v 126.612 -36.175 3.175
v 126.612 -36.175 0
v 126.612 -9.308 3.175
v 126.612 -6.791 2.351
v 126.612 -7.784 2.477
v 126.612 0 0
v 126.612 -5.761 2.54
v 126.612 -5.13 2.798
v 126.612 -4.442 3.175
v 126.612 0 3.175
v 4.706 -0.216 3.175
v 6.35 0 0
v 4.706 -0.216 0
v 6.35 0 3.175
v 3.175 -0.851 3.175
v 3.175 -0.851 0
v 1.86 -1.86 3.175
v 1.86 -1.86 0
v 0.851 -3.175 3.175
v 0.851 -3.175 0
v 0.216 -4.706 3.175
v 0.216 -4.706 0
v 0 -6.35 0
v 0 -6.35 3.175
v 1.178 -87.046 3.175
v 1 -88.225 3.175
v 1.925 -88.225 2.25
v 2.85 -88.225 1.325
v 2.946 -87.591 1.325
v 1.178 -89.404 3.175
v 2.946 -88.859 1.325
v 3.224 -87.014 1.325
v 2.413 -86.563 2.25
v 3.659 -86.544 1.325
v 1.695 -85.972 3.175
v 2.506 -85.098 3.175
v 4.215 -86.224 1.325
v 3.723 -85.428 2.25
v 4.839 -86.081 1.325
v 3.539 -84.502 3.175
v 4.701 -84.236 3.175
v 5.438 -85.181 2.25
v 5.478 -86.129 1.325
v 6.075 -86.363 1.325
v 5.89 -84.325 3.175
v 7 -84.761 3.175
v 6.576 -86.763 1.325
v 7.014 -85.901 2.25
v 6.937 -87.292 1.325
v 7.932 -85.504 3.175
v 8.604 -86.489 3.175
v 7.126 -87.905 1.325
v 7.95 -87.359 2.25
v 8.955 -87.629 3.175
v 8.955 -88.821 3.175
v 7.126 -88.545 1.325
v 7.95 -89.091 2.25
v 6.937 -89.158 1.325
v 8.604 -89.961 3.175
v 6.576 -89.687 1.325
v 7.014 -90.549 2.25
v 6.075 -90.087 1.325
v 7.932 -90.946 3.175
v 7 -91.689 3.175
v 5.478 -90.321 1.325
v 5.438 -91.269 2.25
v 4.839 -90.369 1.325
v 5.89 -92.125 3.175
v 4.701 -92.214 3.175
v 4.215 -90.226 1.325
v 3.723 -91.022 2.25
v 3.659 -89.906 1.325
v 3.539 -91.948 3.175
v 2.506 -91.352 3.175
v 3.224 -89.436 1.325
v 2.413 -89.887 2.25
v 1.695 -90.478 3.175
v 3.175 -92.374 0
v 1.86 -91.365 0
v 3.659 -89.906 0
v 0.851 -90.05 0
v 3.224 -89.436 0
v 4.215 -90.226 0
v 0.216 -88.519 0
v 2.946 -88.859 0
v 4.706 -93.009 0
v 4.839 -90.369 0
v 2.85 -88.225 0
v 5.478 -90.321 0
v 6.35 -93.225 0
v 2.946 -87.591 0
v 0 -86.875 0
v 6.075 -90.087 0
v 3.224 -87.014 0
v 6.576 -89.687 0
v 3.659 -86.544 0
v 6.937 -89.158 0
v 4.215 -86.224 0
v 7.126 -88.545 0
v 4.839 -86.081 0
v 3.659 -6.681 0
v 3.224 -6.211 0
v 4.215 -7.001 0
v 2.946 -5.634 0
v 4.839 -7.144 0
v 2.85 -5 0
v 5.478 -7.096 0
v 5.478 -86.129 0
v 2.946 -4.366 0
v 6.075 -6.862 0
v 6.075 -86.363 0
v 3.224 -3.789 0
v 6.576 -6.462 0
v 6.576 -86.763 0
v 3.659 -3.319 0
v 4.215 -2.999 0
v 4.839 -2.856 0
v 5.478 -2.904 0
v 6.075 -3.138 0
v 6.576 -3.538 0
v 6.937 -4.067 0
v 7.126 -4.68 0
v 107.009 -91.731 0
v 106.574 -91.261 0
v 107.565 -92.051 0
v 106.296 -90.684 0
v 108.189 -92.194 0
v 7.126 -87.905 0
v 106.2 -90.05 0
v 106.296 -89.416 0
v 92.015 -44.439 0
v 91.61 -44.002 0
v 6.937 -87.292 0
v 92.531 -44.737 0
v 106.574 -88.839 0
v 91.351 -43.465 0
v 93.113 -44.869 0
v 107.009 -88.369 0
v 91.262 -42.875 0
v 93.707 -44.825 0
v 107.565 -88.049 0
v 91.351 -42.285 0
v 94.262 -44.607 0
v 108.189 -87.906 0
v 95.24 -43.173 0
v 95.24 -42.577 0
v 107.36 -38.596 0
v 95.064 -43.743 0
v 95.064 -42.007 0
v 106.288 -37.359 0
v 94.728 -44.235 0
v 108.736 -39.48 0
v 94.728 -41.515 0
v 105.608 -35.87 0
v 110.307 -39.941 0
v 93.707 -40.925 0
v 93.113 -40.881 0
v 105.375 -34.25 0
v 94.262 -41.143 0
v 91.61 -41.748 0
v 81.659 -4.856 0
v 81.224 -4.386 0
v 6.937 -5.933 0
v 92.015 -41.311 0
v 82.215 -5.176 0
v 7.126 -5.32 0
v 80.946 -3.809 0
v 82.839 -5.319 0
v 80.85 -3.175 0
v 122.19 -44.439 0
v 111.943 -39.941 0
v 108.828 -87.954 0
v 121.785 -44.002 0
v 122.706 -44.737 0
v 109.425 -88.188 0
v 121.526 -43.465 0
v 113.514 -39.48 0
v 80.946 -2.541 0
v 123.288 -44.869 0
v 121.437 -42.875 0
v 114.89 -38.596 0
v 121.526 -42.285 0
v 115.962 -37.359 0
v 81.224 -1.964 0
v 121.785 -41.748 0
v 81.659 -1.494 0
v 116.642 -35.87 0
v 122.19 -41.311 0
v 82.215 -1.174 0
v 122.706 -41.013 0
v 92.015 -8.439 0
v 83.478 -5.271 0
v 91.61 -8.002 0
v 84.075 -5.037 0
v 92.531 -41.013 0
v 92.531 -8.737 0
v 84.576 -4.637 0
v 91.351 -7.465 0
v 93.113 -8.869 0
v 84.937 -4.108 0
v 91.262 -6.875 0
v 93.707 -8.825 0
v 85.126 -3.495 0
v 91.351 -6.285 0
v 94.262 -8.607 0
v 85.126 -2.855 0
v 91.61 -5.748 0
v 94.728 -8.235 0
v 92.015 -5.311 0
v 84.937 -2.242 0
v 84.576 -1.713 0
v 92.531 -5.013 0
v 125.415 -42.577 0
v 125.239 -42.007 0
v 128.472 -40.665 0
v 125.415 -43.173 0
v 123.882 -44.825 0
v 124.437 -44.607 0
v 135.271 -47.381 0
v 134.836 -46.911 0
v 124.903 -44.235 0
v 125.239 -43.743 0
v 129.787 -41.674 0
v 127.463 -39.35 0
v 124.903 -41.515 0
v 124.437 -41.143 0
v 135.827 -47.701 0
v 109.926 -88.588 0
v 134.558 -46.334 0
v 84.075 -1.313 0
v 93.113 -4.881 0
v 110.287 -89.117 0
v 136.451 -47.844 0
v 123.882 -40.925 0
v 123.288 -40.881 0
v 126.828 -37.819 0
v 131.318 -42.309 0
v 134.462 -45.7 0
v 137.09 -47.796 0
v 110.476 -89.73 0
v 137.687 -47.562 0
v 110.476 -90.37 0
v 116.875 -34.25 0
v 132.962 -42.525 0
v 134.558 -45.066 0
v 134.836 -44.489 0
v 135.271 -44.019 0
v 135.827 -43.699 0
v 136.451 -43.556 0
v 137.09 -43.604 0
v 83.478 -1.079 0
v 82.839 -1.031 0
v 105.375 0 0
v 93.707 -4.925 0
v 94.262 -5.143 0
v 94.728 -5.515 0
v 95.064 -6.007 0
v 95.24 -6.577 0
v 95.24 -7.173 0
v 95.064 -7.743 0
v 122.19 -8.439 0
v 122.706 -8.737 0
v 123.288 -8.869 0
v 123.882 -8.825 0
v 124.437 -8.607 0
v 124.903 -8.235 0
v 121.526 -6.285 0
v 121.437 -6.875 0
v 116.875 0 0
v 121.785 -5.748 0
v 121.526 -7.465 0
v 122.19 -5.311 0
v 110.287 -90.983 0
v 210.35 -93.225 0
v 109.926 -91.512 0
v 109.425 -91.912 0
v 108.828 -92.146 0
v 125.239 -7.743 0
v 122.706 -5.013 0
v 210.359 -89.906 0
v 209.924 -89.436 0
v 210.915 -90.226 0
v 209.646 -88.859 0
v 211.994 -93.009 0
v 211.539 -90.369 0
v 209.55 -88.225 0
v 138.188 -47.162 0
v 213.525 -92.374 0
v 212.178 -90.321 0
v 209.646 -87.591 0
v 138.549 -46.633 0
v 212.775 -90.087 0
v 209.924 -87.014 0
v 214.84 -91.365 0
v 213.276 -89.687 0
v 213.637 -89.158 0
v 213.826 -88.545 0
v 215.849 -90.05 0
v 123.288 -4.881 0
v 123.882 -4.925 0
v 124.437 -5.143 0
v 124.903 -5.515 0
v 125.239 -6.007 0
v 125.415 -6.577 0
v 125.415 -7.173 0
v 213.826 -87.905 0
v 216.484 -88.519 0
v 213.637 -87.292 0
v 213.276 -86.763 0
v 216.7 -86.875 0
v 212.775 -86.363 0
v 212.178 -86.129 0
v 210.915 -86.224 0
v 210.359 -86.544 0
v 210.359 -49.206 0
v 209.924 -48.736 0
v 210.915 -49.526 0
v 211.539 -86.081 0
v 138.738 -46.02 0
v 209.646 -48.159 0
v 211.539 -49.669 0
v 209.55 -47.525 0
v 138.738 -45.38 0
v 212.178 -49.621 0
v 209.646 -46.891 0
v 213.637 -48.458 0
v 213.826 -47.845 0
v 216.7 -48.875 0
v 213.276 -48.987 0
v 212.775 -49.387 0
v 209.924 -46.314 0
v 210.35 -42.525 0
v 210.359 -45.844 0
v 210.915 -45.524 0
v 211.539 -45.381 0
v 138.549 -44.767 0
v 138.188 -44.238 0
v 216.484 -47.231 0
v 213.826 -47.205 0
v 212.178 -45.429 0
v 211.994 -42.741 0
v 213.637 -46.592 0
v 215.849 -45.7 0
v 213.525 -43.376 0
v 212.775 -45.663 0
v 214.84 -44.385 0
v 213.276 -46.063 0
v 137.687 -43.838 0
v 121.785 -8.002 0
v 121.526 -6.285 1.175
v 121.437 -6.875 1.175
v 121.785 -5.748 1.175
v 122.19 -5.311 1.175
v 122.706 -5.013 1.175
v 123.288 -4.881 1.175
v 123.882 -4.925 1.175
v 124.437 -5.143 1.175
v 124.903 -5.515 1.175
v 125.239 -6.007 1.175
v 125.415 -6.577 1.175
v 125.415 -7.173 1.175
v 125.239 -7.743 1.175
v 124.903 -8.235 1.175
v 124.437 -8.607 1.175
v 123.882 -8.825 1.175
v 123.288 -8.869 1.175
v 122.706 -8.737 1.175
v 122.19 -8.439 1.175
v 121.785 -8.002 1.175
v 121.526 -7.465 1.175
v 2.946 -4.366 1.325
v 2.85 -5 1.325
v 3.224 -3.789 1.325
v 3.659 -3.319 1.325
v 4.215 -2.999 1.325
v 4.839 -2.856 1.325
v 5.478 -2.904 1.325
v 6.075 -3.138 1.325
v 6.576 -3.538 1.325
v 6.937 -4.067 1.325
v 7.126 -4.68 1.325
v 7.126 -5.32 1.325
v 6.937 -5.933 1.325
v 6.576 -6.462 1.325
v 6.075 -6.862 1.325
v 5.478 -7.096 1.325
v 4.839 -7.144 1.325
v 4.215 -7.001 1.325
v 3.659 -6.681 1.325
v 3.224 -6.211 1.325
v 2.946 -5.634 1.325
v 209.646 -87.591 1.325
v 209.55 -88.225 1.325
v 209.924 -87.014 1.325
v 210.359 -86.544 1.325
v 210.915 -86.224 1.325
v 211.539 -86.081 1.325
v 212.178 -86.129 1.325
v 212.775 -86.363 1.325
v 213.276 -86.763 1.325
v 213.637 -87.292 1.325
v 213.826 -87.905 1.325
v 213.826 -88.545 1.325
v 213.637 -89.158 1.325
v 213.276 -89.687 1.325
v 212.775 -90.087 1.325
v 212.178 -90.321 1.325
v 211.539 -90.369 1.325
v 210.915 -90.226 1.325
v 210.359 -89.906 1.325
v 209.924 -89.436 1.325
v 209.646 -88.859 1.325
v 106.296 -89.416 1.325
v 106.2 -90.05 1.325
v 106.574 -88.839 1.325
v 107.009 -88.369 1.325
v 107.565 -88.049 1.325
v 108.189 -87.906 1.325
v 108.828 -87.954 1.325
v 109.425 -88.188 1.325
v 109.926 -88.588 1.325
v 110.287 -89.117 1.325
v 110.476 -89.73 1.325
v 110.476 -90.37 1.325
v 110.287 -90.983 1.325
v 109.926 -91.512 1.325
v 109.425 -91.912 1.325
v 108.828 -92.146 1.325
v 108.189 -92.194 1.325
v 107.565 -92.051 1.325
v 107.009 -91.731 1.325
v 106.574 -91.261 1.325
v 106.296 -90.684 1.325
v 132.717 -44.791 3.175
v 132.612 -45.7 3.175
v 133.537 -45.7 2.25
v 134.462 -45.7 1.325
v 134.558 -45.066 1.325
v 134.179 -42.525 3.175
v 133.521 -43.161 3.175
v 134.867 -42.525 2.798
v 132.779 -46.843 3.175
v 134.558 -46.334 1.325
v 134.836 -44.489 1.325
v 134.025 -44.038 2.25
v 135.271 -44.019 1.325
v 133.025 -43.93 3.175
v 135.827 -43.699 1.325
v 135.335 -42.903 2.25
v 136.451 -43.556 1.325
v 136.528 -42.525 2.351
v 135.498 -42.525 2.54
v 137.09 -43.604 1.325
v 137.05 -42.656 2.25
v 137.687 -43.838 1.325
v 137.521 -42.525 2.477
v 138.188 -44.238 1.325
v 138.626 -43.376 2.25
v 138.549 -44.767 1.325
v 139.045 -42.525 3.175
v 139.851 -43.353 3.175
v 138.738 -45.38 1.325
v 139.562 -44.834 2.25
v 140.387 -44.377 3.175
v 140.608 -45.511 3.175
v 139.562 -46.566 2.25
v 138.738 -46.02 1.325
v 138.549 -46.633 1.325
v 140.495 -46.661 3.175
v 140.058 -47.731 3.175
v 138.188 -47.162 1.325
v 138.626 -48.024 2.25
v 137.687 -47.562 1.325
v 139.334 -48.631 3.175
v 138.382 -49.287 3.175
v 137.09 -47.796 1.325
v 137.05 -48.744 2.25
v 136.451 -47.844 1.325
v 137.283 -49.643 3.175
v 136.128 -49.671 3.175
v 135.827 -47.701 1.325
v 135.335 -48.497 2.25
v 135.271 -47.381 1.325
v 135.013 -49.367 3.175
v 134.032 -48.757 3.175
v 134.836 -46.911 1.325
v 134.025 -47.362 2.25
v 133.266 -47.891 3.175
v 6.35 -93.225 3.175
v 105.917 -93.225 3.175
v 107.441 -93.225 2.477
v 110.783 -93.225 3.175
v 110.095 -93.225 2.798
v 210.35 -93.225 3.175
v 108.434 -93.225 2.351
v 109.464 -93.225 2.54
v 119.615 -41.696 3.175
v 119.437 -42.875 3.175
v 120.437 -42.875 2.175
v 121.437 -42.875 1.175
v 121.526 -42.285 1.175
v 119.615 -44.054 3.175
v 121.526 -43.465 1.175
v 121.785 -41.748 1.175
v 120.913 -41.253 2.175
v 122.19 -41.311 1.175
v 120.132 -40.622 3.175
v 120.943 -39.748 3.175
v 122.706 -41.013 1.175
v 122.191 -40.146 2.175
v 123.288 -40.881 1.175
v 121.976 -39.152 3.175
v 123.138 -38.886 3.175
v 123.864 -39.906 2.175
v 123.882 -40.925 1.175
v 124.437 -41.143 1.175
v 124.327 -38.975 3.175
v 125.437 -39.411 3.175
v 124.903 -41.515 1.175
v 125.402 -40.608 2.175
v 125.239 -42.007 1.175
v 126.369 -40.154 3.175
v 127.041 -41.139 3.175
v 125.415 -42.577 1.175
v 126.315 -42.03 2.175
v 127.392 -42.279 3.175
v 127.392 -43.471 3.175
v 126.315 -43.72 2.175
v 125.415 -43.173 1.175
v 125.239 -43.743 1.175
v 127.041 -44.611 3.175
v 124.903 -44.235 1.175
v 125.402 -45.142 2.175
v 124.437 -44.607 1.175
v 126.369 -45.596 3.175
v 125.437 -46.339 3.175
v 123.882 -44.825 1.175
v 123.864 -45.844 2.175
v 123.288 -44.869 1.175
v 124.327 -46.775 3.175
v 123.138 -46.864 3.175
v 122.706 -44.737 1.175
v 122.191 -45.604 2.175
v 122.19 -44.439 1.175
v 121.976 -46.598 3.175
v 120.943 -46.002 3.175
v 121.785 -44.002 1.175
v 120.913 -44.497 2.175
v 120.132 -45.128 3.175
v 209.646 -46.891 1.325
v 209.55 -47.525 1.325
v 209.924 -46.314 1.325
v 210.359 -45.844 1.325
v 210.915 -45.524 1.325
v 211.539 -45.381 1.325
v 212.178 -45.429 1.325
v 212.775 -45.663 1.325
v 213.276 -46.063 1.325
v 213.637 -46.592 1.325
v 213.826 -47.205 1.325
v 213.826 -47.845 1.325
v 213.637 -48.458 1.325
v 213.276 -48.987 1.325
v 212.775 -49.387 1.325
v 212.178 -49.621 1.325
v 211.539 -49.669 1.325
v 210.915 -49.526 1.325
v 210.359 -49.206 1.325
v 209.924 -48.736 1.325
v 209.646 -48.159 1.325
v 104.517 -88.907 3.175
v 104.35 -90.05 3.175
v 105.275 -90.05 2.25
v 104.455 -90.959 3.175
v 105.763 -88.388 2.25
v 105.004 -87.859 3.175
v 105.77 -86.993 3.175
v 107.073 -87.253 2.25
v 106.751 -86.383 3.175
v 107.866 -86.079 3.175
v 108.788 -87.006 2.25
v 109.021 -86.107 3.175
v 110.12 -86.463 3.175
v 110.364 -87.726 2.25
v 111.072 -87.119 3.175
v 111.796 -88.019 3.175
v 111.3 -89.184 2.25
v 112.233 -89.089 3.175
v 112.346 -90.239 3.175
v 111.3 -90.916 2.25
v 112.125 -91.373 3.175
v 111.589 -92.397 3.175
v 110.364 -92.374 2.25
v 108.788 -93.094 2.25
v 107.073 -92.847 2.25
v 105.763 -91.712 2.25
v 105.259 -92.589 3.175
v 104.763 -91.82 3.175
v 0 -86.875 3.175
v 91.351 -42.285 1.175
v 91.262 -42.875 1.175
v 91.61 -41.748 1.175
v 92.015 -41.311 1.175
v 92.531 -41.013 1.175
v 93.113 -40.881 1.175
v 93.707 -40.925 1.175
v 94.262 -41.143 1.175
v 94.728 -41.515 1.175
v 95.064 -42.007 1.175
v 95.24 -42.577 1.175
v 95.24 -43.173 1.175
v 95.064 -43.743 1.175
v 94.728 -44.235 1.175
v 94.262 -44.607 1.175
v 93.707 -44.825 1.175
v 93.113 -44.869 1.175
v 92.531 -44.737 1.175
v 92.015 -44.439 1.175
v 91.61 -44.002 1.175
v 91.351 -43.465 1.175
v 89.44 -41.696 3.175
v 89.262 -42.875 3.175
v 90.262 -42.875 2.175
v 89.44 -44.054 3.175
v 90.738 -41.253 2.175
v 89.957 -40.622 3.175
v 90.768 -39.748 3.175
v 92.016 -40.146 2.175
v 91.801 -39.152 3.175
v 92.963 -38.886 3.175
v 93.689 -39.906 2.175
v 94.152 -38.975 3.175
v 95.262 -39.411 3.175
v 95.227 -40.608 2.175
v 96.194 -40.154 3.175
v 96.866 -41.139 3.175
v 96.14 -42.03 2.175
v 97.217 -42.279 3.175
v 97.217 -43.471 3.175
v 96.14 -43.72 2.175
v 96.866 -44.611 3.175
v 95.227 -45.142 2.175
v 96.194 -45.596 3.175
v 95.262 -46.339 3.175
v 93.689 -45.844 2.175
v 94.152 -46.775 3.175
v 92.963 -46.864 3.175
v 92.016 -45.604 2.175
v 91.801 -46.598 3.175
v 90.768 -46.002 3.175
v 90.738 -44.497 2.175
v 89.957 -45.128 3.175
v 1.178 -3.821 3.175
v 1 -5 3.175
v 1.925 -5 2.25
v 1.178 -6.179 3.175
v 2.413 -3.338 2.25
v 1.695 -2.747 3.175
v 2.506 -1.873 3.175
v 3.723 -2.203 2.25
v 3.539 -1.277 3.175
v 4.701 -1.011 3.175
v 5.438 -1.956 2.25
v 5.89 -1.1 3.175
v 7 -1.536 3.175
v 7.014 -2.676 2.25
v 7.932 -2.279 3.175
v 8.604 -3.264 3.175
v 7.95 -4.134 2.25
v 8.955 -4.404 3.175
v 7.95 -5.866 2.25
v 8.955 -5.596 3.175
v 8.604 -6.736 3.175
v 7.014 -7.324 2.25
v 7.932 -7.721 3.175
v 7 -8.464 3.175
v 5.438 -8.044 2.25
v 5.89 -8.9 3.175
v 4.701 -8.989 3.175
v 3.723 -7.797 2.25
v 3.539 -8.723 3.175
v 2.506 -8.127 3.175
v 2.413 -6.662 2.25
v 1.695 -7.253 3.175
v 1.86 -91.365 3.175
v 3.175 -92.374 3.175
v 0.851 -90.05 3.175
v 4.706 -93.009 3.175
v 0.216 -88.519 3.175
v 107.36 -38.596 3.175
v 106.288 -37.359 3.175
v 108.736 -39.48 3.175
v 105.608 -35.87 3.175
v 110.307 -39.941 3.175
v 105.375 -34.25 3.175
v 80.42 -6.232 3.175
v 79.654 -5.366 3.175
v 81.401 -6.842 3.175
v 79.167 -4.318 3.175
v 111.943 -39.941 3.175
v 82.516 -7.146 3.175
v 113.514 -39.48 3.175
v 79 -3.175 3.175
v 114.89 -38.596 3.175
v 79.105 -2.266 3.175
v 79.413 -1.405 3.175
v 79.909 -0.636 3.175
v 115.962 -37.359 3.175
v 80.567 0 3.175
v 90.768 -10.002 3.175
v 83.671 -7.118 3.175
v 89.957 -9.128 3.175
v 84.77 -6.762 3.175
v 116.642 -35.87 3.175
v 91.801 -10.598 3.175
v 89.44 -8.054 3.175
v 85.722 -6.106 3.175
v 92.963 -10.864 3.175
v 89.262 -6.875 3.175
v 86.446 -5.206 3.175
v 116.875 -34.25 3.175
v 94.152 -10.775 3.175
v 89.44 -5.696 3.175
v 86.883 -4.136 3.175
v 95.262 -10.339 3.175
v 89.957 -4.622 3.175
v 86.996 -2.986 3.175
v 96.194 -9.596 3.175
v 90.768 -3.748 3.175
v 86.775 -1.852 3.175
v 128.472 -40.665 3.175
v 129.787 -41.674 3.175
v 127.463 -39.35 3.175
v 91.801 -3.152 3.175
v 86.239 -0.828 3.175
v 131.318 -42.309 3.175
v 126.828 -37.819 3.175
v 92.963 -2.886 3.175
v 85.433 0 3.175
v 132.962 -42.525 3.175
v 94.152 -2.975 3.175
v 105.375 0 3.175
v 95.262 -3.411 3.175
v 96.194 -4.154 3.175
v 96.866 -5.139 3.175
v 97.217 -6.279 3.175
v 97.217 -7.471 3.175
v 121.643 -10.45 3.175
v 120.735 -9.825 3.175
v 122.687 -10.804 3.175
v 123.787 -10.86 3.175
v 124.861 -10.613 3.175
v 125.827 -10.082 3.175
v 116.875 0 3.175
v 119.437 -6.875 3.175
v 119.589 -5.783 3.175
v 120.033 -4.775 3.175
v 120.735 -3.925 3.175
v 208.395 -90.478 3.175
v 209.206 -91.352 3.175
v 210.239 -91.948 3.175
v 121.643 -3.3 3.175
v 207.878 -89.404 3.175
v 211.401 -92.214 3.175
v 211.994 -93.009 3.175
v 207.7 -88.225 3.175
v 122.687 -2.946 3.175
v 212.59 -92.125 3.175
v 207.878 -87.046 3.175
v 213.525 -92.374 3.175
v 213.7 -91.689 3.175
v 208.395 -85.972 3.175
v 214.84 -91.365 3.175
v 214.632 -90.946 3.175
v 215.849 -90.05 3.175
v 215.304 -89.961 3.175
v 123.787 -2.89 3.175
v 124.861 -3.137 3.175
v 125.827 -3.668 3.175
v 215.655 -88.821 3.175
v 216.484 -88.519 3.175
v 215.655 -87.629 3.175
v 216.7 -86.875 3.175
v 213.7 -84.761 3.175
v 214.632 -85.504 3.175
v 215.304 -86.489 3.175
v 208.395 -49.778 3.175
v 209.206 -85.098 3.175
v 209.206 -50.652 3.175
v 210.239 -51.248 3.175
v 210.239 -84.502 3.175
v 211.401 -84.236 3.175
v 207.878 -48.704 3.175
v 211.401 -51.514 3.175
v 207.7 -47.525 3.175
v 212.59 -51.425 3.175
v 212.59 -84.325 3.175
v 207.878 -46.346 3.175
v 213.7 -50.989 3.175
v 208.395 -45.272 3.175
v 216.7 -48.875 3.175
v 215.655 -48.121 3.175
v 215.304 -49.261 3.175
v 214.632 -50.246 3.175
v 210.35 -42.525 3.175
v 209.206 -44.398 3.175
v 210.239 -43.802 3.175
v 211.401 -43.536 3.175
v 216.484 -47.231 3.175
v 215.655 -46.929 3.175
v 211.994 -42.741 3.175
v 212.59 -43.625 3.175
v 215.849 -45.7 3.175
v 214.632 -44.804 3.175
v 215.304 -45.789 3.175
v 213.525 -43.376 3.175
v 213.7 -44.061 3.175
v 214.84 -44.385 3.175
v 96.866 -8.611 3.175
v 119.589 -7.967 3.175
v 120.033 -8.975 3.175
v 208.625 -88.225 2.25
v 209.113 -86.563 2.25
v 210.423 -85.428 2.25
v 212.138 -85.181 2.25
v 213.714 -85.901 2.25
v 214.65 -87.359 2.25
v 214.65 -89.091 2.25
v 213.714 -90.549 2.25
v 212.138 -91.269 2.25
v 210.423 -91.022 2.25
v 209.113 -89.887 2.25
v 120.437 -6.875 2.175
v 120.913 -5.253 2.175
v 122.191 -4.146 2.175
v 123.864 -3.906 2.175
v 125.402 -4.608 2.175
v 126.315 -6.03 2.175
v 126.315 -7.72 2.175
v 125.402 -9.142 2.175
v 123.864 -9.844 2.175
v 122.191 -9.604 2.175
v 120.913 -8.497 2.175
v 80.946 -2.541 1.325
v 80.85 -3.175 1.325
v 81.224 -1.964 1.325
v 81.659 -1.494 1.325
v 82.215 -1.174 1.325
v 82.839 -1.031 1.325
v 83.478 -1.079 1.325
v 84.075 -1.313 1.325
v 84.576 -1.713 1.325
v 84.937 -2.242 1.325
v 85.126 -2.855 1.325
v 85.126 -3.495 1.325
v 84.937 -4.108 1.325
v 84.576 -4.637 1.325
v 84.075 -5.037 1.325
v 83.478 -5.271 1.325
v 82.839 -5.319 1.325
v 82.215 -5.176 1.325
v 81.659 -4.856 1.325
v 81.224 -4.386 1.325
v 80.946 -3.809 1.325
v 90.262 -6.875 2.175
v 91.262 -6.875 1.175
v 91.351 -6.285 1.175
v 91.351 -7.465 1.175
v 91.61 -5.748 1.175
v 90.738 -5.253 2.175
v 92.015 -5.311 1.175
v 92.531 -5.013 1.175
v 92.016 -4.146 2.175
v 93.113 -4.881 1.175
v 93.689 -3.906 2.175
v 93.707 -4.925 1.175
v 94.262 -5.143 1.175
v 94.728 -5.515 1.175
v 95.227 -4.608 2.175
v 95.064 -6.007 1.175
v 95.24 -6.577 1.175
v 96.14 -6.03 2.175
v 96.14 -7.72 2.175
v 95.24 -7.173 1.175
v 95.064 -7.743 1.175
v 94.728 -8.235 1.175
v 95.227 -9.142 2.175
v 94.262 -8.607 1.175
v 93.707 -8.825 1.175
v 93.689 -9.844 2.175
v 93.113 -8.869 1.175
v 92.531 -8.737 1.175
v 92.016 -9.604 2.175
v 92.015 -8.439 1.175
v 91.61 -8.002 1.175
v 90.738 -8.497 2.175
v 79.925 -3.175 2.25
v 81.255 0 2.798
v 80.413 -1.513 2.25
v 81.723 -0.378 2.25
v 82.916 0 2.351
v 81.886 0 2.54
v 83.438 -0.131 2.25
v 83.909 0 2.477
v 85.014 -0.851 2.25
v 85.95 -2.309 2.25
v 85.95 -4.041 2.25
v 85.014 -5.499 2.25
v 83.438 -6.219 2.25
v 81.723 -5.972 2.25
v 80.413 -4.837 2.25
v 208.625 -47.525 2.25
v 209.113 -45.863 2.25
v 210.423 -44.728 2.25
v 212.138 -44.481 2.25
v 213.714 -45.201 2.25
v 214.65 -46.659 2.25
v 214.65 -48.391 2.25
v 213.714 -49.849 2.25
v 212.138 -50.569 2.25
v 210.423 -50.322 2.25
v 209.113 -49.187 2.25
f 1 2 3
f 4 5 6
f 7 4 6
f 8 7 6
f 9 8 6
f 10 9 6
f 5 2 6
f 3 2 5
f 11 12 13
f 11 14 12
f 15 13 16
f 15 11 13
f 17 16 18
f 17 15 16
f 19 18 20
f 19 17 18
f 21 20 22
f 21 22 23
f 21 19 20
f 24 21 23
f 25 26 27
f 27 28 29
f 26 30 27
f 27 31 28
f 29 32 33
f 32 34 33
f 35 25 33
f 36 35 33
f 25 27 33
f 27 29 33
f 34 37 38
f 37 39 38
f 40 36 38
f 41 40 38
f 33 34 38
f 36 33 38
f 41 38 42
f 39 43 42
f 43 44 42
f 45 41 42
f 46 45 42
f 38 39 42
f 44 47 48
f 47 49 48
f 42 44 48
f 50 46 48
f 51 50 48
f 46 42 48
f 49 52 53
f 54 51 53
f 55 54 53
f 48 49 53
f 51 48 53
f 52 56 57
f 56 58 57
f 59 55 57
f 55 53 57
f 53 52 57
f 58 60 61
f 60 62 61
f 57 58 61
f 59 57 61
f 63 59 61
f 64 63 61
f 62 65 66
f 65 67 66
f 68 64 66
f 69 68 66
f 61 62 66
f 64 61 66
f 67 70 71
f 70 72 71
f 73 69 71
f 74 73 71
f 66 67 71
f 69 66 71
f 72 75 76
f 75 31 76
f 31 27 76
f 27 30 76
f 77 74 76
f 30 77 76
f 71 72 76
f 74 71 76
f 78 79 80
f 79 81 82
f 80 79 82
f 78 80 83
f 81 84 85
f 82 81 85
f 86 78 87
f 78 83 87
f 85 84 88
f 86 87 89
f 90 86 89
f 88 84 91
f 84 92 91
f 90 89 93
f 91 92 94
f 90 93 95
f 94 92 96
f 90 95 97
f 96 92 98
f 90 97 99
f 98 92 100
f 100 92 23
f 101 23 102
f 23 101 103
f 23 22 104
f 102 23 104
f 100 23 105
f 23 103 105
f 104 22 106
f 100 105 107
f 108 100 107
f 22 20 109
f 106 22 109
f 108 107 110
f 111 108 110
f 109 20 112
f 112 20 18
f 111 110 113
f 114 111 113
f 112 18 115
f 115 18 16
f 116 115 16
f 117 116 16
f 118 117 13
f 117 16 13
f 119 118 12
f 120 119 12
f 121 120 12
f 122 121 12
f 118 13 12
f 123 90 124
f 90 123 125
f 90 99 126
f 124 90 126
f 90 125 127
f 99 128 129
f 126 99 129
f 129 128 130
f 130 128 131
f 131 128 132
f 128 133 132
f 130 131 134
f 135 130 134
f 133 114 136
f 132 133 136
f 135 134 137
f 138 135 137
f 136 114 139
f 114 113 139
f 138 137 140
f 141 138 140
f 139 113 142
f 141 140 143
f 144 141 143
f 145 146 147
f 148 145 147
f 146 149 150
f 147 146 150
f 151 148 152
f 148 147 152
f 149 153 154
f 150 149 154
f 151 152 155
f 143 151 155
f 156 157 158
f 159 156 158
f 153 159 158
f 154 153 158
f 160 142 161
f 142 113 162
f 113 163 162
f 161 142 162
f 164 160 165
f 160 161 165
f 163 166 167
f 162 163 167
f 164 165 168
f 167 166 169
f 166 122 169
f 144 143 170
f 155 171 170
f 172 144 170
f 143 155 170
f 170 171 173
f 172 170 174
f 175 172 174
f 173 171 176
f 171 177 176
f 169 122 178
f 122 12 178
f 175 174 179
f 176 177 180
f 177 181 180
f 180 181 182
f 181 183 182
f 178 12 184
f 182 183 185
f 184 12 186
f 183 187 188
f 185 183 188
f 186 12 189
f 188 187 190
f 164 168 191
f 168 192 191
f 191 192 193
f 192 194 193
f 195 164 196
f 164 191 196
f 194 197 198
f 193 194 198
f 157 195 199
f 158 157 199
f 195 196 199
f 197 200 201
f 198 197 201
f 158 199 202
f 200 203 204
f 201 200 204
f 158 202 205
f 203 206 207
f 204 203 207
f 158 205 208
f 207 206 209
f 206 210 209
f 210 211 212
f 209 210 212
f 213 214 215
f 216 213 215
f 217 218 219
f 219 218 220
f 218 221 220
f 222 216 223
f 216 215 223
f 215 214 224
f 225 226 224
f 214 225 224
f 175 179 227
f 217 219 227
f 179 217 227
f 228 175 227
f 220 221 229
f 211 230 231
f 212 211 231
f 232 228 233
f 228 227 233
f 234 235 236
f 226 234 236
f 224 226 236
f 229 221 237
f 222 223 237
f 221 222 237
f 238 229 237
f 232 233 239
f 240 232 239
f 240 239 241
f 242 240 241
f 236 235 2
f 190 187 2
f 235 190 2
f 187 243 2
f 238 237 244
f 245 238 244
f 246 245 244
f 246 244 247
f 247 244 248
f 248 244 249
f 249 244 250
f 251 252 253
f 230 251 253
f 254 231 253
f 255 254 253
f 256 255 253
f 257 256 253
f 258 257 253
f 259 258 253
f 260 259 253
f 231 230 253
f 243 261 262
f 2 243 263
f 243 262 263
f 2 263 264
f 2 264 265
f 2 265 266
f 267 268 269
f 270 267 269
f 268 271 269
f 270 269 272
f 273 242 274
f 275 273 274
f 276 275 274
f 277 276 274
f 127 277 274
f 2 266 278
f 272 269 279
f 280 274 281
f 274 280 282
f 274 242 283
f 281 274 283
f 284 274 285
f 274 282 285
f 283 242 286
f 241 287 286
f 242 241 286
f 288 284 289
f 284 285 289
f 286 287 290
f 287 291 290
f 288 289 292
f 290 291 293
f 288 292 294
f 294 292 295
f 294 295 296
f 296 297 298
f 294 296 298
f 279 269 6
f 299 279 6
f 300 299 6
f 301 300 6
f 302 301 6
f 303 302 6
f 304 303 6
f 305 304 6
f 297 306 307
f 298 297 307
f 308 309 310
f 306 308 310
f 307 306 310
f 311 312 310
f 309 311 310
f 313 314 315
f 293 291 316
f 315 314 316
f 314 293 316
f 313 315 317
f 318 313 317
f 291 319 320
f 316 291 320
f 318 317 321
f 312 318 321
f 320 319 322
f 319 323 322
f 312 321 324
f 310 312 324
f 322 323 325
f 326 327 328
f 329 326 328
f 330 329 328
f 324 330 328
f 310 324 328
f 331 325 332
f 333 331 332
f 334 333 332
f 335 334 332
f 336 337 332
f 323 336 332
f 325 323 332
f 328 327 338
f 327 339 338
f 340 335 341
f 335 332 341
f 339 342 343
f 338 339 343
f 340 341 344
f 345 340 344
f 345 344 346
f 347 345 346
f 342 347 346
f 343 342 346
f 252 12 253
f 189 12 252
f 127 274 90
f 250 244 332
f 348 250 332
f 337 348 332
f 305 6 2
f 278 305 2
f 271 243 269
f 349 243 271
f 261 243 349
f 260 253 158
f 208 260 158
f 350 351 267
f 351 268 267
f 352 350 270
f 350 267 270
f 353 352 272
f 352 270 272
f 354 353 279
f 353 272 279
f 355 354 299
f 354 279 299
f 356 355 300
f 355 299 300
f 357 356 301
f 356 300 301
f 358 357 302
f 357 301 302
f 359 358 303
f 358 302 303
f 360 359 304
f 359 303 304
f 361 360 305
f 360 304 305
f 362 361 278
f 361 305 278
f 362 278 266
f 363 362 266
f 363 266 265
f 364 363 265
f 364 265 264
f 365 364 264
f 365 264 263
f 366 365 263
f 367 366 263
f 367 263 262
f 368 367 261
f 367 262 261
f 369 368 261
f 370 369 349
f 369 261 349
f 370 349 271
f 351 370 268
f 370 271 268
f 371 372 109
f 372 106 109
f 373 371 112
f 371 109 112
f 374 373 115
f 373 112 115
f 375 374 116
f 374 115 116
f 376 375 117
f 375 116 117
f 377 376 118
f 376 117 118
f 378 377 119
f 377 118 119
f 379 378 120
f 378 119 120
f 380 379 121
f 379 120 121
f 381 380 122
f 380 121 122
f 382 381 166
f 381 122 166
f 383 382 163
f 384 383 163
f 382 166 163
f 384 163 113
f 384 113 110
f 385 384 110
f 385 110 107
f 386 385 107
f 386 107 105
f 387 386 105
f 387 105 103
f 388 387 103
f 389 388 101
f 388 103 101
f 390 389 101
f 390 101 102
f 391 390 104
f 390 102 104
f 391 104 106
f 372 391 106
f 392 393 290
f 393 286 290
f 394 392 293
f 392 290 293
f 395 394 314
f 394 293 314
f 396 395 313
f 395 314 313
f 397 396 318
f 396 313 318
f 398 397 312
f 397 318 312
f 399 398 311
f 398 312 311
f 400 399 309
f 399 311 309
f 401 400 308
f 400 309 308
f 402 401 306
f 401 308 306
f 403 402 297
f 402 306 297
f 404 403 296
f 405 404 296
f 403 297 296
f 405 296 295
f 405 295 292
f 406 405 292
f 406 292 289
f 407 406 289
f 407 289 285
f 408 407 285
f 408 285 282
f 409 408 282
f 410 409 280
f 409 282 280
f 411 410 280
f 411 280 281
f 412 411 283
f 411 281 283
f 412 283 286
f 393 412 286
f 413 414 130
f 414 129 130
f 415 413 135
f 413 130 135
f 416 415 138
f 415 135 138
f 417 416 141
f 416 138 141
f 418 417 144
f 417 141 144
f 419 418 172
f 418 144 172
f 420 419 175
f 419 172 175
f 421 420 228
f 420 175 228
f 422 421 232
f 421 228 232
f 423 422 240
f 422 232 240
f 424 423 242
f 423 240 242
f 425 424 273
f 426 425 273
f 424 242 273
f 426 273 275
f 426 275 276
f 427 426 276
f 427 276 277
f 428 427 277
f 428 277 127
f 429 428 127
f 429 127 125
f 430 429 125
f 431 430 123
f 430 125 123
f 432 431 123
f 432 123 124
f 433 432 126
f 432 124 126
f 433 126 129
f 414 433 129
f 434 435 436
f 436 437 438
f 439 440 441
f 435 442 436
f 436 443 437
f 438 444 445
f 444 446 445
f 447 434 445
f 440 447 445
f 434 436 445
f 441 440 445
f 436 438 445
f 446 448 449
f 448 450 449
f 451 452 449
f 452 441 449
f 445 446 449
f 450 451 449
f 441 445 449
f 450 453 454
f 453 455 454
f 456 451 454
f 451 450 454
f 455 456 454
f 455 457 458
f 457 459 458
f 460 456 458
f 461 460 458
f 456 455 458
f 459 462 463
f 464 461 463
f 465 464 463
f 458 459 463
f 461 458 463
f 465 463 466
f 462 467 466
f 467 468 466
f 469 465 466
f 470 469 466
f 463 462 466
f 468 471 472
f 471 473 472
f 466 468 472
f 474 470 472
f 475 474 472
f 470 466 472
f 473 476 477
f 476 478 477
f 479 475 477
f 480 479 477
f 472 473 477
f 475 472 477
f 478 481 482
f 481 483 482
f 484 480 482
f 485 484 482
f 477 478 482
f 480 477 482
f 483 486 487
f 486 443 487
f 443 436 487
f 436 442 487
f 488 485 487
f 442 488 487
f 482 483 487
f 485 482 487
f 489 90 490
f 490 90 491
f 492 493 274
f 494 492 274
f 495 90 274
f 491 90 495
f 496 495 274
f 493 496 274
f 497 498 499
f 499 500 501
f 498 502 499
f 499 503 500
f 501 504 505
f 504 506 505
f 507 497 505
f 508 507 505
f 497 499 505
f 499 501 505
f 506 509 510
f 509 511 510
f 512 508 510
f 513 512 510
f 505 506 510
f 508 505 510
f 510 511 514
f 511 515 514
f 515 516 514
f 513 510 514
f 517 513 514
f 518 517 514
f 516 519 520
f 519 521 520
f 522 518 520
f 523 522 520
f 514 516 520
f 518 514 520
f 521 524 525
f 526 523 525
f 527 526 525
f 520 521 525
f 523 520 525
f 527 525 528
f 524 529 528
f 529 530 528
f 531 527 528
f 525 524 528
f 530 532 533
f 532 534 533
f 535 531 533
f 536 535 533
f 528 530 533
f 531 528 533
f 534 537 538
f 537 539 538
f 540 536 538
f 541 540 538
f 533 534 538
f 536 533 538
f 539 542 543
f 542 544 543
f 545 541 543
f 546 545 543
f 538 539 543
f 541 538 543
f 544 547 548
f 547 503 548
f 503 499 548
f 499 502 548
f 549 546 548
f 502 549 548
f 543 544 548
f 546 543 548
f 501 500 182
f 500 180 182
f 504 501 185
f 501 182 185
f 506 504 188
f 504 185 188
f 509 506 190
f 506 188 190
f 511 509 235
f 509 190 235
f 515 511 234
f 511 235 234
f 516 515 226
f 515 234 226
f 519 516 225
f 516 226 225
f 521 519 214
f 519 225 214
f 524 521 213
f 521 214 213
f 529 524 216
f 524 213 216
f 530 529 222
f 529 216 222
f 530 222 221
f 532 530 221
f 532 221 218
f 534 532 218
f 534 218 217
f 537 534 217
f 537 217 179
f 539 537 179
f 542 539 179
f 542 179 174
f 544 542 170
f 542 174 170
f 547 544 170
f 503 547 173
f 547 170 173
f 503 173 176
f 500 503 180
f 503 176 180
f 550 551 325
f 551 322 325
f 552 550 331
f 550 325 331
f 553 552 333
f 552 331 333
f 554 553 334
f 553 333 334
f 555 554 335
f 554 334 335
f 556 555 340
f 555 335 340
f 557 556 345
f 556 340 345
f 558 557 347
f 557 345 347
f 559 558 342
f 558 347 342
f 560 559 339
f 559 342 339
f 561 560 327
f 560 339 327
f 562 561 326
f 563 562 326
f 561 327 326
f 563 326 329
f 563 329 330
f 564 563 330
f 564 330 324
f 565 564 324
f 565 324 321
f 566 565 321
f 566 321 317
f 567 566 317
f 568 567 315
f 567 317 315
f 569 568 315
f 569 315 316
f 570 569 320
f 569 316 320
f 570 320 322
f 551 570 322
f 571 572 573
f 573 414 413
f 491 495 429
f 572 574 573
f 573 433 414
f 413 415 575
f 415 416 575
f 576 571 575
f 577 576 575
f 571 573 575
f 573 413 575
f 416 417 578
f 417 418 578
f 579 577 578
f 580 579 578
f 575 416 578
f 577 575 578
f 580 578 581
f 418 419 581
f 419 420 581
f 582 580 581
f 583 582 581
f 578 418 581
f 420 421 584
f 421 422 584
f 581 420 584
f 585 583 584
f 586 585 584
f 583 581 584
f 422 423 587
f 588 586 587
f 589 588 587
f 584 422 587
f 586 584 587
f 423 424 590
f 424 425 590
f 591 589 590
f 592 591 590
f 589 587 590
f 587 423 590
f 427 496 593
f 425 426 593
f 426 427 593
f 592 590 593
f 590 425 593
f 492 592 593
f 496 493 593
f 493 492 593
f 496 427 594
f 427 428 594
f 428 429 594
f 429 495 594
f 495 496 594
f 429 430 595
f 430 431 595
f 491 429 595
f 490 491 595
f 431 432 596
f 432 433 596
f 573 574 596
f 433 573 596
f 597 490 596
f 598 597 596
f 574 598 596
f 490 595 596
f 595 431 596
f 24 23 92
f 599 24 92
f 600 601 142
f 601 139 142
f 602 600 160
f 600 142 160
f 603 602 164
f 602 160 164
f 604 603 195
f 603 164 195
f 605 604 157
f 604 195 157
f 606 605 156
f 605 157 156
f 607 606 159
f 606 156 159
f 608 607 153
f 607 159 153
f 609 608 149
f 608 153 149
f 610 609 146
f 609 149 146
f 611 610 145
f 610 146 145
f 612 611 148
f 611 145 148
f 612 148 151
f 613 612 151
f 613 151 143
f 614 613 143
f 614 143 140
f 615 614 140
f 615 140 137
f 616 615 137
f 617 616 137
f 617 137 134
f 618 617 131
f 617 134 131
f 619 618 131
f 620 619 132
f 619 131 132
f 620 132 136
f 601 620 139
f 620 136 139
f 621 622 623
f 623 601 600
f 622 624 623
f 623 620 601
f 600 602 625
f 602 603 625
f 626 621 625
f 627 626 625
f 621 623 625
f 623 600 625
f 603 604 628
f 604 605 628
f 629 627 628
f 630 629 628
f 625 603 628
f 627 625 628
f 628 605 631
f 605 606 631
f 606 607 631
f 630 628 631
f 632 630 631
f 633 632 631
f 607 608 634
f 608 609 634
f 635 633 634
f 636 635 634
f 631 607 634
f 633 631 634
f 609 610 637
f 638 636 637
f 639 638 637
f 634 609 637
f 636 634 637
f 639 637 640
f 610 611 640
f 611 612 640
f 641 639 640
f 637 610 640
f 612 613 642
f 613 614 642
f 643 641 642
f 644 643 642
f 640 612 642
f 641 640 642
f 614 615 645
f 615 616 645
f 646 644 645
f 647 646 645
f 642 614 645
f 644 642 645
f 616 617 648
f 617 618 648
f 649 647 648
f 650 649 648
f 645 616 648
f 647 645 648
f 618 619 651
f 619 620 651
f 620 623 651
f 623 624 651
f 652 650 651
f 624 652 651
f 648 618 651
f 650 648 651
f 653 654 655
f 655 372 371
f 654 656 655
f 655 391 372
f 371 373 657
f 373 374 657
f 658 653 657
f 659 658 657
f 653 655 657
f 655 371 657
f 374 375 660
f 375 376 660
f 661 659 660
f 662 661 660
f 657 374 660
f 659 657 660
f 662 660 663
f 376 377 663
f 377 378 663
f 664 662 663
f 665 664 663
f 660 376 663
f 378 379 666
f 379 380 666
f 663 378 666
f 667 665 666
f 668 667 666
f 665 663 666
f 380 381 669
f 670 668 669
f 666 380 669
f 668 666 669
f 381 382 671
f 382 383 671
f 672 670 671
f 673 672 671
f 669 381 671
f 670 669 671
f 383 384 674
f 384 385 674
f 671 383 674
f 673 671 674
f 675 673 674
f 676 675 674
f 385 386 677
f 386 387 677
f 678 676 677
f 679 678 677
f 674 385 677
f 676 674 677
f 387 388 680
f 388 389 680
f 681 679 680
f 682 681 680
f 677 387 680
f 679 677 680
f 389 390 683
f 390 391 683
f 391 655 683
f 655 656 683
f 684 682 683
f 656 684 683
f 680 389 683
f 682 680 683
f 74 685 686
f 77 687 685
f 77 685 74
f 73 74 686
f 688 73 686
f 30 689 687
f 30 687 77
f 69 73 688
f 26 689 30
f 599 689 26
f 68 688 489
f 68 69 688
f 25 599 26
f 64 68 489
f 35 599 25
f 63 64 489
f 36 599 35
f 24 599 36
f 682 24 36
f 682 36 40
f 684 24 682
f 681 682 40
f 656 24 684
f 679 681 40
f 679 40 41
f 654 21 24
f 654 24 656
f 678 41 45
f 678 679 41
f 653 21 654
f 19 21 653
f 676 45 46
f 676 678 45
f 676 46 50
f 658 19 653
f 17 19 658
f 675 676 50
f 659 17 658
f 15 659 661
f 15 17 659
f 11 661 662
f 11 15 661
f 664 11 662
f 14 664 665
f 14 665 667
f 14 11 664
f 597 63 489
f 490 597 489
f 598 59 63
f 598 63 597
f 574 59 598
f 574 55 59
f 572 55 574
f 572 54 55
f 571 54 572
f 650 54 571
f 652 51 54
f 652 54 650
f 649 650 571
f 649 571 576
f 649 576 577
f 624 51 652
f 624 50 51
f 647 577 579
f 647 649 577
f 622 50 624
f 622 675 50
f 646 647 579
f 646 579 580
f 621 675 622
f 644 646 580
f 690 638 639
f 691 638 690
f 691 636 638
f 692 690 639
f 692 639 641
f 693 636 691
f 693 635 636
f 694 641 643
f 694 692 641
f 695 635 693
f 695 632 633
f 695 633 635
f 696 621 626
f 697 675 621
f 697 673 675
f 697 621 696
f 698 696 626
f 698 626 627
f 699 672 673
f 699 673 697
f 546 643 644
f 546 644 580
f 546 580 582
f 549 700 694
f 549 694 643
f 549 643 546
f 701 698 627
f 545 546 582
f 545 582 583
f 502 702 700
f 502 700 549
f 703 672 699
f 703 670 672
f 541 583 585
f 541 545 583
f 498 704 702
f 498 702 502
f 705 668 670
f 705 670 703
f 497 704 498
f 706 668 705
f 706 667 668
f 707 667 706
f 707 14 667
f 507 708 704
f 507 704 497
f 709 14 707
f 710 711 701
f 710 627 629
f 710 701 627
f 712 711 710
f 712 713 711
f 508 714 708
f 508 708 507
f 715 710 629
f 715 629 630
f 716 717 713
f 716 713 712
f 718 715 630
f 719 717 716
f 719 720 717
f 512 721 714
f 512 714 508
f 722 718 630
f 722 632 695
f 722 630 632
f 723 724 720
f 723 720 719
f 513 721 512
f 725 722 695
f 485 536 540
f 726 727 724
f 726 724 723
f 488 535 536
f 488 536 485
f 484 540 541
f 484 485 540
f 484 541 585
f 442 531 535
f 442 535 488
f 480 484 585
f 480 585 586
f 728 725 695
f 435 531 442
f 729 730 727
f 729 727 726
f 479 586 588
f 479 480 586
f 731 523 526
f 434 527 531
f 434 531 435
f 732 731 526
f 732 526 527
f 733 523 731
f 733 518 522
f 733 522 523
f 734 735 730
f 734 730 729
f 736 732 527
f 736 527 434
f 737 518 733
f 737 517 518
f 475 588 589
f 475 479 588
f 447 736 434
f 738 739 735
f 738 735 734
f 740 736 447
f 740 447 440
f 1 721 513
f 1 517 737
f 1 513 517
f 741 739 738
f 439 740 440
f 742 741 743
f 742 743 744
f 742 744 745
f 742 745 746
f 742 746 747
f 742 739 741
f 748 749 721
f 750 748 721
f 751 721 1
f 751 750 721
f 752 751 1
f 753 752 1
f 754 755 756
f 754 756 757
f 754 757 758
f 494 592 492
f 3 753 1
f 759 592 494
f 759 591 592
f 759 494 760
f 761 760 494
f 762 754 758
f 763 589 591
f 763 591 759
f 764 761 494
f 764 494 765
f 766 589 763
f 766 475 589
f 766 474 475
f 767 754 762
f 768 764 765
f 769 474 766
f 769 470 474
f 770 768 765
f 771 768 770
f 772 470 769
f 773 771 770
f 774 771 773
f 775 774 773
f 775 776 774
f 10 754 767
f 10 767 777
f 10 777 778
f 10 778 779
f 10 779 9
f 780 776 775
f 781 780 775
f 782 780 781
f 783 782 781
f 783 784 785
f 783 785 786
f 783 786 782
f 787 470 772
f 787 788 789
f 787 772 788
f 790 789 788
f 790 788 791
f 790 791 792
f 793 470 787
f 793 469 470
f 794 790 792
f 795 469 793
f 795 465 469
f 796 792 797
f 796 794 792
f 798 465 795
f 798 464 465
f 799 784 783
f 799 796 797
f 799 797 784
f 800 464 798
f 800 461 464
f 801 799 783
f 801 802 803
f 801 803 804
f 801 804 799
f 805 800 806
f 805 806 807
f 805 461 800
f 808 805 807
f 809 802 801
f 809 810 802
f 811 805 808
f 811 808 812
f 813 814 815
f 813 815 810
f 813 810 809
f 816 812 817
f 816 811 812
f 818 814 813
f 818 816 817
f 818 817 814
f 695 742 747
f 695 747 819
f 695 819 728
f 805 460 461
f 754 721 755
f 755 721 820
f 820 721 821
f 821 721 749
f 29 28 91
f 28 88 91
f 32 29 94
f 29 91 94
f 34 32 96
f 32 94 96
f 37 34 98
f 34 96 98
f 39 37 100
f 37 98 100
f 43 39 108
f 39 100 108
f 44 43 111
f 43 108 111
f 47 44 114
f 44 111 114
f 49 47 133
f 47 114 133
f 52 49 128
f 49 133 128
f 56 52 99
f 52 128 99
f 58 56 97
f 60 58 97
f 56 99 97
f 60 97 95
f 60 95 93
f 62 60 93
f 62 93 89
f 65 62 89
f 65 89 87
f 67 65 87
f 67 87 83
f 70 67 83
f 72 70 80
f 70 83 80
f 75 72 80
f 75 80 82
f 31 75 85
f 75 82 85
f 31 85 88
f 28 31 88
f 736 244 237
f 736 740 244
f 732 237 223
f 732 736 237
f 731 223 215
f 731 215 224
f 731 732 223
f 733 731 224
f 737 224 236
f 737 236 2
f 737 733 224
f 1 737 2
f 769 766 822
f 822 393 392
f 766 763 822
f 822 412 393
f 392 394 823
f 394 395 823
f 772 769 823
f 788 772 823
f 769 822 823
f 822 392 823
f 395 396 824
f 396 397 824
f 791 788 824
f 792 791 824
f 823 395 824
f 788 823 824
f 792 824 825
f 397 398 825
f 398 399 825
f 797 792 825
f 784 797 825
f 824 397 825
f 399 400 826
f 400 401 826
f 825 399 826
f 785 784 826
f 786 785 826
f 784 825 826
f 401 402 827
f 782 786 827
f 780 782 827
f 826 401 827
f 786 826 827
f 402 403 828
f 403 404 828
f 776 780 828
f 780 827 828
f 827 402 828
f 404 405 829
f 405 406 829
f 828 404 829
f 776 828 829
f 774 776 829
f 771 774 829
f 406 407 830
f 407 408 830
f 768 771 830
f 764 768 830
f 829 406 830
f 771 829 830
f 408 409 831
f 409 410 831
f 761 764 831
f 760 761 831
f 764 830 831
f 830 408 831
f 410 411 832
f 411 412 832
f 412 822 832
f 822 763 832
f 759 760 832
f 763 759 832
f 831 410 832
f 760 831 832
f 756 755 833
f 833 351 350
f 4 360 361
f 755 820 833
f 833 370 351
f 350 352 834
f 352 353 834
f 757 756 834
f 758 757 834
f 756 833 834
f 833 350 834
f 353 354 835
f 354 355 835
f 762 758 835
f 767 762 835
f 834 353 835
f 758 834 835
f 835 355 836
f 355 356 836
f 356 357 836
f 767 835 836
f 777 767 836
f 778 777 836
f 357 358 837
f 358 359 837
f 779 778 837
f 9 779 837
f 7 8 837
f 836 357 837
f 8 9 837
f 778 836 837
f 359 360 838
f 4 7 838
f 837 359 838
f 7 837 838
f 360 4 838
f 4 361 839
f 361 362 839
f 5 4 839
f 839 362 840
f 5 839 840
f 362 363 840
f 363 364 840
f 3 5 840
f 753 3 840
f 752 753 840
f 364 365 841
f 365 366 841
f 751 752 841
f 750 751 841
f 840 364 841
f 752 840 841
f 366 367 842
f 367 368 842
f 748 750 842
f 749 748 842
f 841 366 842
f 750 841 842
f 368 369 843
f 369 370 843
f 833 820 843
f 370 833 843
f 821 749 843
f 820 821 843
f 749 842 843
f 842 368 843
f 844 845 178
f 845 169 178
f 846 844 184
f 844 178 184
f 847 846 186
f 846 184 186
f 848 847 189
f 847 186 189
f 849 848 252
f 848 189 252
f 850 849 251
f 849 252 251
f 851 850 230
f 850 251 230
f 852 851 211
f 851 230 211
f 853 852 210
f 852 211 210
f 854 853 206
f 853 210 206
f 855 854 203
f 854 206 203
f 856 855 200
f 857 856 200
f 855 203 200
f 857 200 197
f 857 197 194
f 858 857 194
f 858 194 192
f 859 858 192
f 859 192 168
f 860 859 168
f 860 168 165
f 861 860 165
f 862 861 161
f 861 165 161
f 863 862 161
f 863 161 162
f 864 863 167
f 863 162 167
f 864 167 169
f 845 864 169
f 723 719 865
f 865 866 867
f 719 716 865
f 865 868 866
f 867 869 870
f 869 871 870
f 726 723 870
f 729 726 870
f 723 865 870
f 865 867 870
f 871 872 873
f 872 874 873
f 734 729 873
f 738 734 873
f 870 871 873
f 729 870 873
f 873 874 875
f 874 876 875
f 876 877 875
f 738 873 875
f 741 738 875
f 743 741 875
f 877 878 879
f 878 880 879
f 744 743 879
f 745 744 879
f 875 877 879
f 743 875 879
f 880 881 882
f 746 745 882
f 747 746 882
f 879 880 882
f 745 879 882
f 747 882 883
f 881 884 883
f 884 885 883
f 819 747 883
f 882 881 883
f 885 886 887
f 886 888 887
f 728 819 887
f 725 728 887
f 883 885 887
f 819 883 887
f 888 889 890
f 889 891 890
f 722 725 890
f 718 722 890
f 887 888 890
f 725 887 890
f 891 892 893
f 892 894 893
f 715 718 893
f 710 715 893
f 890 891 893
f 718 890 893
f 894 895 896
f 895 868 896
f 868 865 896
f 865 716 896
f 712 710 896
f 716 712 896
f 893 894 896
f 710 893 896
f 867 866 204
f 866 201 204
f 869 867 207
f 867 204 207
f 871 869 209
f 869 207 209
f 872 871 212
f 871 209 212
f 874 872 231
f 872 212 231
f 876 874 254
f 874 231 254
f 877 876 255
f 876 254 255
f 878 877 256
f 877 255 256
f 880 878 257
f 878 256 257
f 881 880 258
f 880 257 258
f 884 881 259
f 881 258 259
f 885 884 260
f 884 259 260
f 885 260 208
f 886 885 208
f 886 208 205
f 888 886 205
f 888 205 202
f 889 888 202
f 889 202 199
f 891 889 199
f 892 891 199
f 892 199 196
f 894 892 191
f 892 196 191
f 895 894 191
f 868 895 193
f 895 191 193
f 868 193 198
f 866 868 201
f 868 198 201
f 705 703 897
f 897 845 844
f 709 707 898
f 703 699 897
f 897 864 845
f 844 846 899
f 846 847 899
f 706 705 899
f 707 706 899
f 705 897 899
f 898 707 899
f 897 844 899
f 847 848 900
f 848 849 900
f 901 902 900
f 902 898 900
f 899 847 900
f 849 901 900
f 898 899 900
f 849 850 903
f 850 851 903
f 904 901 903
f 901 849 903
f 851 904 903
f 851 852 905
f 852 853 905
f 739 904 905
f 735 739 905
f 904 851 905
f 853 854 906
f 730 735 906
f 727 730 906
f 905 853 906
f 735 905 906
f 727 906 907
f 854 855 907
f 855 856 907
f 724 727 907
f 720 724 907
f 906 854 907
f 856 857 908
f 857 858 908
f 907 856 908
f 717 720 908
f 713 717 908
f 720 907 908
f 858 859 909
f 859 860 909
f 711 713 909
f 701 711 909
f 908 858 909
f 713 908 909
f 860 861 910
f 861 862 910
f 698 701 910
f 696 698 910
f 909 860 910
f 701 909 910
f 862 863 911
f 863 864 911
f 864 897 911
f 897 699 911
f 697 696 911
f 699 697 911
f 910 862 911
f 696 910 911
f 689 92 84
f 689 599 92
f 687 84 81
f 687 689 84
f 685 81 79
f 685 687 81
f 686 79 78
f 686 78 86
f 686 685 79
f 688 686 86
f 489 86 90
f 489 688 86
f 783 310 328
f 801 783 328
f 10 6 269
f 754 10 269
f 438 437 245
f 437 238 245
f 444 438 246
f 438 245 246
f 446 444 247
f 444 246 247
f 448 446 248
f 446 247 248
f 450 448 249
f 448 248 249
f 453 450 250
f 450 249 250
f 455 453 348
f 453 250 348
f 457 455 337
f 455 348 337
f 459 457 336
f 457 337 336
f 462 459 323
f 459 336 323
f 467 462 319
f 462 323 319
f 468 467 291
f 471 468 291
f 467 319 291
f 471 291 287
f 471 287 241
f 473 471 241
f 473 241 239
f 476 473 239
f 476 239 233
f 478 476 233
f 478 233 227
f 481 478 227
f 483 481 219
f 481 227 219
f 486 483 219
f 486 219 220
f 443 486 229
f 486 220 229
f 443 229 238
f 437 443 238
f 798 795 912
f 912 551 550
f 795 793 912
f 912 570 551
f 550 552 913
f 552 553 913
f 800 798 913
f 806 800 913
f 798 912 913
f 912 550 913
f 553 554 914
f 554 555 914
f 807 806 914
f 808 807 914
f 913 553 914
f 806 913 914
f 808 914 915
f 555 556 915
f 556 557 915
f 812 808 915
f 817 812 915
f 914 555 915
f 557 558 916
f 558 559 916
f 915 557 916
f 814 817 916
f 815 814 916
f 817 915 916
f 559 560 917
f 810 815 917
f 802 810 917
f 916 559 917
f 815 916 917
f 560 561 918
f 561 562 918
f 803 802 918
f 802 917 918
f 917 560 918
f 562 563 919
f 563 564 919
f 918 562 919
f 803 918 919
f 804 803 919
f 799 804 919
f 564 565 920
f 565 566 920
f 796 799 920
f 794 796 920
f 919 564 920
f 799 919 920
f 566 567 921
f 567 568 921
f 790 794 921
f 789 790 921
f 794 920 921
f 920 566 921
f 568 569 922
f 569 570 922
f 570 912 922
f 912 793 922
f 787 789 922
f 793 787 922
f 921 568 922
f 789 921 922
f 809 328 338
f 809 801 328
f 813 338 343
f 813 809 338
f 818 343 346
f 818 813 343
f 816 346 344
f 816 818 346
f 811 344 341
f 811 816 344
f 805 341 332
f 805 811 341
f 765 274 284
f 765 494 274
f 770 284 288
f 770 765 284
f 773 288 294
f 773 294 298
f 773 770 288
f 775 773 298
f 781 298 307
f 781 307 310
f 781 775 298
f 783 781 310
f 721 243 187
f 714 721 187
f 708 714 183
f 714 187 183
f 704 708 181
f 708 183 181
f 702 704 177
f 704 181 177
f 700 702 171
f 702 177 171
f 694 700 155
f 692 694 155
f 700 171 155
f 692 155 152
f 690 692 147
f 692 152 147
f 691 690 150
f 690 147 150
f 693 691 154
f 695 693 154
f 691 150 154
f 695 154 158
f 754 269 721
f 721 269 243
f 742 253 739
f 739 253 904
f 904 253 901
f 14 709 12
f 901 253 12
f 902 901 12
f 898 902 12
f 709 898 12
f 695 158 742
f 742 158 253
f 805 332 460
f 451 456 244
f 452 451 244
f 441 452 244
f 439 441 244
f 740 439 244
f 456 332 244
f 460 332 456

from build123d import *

# Parameters (mm, degrees)
F1_DEPTH       = 3.175
F2_R           = 6.35
F4_D           = 4.3
F4_CSINK_D     = 8
F4_CSINK_ANGLE = 90
F6_D           = 4
F6_CSINK_D     = 8
F6_CSINK_ANGLE = 90


with BuildPart() as f1:
    # F0 (on Top) → F1 (new body)
    with BuildSketch(Plane.XY):
        with BuildLine():
            Line((105.375, 0), (0, 0))
            Line((0, 0), (0, -93.225))
            Line((0, -93.225), (216.7, -93.225))
            Line((216.7, -93.225), (216.7, -42.525))
            Line((216.7, -42.525), (126.612, -42.525))
            Line((126.612, -42.525), (126.612, 0))
            Line((126.612, 0), (116.875, 0))
            Line((116.875, 0), (116.875, -34.25))
            ThreePointArc((116.875, -34.25), (111.125, -40), (105.375, -34.25))
            Line((105.375, -34.25), (105.375, 0))
        make_face()
    extrude(amount=F1_DEPTH)

    # F2
    f2_edges = [f1.edges().sort_by_distance(p)[0] for p in [
        (0, 0, 1.5875),
        (0, -93.225, 1.5875),
        (126.612, -42.525, 1.5875),
        (216.7, -42.525, 1.5875),
        (216.7, -93.225, 1.5875),
    ]]
    fillet(f2_edges, radius=F2_R)

    # F4 (through all)
    with Locations(Plane.XY.offset(3.175)):
        with Locations((5, -5), (5, -88.225), (211.7, -88.225), (211.7, -47.525), (136.612, -45.7), (83, -3.175), (108.35, -90.05)):
            CounterSinkHole(F4_D / 2, F4_CSINK_D / 2, counter_sink_angle=F4_CSINK_ANGLE)

    # F6 (through all)
    with Locations(Plane.XY.offset(3.175)):
        with Locations((123.437, -42.875), (123.437, -6.875), (93.262, -6.875), (93.262, -42.875)):
            CounterSinkHole(F6_D / 2, F6_CSINK_D / 2, counter_sink_angle=F6_CSINK_ANGLE)


solid = f1.part
